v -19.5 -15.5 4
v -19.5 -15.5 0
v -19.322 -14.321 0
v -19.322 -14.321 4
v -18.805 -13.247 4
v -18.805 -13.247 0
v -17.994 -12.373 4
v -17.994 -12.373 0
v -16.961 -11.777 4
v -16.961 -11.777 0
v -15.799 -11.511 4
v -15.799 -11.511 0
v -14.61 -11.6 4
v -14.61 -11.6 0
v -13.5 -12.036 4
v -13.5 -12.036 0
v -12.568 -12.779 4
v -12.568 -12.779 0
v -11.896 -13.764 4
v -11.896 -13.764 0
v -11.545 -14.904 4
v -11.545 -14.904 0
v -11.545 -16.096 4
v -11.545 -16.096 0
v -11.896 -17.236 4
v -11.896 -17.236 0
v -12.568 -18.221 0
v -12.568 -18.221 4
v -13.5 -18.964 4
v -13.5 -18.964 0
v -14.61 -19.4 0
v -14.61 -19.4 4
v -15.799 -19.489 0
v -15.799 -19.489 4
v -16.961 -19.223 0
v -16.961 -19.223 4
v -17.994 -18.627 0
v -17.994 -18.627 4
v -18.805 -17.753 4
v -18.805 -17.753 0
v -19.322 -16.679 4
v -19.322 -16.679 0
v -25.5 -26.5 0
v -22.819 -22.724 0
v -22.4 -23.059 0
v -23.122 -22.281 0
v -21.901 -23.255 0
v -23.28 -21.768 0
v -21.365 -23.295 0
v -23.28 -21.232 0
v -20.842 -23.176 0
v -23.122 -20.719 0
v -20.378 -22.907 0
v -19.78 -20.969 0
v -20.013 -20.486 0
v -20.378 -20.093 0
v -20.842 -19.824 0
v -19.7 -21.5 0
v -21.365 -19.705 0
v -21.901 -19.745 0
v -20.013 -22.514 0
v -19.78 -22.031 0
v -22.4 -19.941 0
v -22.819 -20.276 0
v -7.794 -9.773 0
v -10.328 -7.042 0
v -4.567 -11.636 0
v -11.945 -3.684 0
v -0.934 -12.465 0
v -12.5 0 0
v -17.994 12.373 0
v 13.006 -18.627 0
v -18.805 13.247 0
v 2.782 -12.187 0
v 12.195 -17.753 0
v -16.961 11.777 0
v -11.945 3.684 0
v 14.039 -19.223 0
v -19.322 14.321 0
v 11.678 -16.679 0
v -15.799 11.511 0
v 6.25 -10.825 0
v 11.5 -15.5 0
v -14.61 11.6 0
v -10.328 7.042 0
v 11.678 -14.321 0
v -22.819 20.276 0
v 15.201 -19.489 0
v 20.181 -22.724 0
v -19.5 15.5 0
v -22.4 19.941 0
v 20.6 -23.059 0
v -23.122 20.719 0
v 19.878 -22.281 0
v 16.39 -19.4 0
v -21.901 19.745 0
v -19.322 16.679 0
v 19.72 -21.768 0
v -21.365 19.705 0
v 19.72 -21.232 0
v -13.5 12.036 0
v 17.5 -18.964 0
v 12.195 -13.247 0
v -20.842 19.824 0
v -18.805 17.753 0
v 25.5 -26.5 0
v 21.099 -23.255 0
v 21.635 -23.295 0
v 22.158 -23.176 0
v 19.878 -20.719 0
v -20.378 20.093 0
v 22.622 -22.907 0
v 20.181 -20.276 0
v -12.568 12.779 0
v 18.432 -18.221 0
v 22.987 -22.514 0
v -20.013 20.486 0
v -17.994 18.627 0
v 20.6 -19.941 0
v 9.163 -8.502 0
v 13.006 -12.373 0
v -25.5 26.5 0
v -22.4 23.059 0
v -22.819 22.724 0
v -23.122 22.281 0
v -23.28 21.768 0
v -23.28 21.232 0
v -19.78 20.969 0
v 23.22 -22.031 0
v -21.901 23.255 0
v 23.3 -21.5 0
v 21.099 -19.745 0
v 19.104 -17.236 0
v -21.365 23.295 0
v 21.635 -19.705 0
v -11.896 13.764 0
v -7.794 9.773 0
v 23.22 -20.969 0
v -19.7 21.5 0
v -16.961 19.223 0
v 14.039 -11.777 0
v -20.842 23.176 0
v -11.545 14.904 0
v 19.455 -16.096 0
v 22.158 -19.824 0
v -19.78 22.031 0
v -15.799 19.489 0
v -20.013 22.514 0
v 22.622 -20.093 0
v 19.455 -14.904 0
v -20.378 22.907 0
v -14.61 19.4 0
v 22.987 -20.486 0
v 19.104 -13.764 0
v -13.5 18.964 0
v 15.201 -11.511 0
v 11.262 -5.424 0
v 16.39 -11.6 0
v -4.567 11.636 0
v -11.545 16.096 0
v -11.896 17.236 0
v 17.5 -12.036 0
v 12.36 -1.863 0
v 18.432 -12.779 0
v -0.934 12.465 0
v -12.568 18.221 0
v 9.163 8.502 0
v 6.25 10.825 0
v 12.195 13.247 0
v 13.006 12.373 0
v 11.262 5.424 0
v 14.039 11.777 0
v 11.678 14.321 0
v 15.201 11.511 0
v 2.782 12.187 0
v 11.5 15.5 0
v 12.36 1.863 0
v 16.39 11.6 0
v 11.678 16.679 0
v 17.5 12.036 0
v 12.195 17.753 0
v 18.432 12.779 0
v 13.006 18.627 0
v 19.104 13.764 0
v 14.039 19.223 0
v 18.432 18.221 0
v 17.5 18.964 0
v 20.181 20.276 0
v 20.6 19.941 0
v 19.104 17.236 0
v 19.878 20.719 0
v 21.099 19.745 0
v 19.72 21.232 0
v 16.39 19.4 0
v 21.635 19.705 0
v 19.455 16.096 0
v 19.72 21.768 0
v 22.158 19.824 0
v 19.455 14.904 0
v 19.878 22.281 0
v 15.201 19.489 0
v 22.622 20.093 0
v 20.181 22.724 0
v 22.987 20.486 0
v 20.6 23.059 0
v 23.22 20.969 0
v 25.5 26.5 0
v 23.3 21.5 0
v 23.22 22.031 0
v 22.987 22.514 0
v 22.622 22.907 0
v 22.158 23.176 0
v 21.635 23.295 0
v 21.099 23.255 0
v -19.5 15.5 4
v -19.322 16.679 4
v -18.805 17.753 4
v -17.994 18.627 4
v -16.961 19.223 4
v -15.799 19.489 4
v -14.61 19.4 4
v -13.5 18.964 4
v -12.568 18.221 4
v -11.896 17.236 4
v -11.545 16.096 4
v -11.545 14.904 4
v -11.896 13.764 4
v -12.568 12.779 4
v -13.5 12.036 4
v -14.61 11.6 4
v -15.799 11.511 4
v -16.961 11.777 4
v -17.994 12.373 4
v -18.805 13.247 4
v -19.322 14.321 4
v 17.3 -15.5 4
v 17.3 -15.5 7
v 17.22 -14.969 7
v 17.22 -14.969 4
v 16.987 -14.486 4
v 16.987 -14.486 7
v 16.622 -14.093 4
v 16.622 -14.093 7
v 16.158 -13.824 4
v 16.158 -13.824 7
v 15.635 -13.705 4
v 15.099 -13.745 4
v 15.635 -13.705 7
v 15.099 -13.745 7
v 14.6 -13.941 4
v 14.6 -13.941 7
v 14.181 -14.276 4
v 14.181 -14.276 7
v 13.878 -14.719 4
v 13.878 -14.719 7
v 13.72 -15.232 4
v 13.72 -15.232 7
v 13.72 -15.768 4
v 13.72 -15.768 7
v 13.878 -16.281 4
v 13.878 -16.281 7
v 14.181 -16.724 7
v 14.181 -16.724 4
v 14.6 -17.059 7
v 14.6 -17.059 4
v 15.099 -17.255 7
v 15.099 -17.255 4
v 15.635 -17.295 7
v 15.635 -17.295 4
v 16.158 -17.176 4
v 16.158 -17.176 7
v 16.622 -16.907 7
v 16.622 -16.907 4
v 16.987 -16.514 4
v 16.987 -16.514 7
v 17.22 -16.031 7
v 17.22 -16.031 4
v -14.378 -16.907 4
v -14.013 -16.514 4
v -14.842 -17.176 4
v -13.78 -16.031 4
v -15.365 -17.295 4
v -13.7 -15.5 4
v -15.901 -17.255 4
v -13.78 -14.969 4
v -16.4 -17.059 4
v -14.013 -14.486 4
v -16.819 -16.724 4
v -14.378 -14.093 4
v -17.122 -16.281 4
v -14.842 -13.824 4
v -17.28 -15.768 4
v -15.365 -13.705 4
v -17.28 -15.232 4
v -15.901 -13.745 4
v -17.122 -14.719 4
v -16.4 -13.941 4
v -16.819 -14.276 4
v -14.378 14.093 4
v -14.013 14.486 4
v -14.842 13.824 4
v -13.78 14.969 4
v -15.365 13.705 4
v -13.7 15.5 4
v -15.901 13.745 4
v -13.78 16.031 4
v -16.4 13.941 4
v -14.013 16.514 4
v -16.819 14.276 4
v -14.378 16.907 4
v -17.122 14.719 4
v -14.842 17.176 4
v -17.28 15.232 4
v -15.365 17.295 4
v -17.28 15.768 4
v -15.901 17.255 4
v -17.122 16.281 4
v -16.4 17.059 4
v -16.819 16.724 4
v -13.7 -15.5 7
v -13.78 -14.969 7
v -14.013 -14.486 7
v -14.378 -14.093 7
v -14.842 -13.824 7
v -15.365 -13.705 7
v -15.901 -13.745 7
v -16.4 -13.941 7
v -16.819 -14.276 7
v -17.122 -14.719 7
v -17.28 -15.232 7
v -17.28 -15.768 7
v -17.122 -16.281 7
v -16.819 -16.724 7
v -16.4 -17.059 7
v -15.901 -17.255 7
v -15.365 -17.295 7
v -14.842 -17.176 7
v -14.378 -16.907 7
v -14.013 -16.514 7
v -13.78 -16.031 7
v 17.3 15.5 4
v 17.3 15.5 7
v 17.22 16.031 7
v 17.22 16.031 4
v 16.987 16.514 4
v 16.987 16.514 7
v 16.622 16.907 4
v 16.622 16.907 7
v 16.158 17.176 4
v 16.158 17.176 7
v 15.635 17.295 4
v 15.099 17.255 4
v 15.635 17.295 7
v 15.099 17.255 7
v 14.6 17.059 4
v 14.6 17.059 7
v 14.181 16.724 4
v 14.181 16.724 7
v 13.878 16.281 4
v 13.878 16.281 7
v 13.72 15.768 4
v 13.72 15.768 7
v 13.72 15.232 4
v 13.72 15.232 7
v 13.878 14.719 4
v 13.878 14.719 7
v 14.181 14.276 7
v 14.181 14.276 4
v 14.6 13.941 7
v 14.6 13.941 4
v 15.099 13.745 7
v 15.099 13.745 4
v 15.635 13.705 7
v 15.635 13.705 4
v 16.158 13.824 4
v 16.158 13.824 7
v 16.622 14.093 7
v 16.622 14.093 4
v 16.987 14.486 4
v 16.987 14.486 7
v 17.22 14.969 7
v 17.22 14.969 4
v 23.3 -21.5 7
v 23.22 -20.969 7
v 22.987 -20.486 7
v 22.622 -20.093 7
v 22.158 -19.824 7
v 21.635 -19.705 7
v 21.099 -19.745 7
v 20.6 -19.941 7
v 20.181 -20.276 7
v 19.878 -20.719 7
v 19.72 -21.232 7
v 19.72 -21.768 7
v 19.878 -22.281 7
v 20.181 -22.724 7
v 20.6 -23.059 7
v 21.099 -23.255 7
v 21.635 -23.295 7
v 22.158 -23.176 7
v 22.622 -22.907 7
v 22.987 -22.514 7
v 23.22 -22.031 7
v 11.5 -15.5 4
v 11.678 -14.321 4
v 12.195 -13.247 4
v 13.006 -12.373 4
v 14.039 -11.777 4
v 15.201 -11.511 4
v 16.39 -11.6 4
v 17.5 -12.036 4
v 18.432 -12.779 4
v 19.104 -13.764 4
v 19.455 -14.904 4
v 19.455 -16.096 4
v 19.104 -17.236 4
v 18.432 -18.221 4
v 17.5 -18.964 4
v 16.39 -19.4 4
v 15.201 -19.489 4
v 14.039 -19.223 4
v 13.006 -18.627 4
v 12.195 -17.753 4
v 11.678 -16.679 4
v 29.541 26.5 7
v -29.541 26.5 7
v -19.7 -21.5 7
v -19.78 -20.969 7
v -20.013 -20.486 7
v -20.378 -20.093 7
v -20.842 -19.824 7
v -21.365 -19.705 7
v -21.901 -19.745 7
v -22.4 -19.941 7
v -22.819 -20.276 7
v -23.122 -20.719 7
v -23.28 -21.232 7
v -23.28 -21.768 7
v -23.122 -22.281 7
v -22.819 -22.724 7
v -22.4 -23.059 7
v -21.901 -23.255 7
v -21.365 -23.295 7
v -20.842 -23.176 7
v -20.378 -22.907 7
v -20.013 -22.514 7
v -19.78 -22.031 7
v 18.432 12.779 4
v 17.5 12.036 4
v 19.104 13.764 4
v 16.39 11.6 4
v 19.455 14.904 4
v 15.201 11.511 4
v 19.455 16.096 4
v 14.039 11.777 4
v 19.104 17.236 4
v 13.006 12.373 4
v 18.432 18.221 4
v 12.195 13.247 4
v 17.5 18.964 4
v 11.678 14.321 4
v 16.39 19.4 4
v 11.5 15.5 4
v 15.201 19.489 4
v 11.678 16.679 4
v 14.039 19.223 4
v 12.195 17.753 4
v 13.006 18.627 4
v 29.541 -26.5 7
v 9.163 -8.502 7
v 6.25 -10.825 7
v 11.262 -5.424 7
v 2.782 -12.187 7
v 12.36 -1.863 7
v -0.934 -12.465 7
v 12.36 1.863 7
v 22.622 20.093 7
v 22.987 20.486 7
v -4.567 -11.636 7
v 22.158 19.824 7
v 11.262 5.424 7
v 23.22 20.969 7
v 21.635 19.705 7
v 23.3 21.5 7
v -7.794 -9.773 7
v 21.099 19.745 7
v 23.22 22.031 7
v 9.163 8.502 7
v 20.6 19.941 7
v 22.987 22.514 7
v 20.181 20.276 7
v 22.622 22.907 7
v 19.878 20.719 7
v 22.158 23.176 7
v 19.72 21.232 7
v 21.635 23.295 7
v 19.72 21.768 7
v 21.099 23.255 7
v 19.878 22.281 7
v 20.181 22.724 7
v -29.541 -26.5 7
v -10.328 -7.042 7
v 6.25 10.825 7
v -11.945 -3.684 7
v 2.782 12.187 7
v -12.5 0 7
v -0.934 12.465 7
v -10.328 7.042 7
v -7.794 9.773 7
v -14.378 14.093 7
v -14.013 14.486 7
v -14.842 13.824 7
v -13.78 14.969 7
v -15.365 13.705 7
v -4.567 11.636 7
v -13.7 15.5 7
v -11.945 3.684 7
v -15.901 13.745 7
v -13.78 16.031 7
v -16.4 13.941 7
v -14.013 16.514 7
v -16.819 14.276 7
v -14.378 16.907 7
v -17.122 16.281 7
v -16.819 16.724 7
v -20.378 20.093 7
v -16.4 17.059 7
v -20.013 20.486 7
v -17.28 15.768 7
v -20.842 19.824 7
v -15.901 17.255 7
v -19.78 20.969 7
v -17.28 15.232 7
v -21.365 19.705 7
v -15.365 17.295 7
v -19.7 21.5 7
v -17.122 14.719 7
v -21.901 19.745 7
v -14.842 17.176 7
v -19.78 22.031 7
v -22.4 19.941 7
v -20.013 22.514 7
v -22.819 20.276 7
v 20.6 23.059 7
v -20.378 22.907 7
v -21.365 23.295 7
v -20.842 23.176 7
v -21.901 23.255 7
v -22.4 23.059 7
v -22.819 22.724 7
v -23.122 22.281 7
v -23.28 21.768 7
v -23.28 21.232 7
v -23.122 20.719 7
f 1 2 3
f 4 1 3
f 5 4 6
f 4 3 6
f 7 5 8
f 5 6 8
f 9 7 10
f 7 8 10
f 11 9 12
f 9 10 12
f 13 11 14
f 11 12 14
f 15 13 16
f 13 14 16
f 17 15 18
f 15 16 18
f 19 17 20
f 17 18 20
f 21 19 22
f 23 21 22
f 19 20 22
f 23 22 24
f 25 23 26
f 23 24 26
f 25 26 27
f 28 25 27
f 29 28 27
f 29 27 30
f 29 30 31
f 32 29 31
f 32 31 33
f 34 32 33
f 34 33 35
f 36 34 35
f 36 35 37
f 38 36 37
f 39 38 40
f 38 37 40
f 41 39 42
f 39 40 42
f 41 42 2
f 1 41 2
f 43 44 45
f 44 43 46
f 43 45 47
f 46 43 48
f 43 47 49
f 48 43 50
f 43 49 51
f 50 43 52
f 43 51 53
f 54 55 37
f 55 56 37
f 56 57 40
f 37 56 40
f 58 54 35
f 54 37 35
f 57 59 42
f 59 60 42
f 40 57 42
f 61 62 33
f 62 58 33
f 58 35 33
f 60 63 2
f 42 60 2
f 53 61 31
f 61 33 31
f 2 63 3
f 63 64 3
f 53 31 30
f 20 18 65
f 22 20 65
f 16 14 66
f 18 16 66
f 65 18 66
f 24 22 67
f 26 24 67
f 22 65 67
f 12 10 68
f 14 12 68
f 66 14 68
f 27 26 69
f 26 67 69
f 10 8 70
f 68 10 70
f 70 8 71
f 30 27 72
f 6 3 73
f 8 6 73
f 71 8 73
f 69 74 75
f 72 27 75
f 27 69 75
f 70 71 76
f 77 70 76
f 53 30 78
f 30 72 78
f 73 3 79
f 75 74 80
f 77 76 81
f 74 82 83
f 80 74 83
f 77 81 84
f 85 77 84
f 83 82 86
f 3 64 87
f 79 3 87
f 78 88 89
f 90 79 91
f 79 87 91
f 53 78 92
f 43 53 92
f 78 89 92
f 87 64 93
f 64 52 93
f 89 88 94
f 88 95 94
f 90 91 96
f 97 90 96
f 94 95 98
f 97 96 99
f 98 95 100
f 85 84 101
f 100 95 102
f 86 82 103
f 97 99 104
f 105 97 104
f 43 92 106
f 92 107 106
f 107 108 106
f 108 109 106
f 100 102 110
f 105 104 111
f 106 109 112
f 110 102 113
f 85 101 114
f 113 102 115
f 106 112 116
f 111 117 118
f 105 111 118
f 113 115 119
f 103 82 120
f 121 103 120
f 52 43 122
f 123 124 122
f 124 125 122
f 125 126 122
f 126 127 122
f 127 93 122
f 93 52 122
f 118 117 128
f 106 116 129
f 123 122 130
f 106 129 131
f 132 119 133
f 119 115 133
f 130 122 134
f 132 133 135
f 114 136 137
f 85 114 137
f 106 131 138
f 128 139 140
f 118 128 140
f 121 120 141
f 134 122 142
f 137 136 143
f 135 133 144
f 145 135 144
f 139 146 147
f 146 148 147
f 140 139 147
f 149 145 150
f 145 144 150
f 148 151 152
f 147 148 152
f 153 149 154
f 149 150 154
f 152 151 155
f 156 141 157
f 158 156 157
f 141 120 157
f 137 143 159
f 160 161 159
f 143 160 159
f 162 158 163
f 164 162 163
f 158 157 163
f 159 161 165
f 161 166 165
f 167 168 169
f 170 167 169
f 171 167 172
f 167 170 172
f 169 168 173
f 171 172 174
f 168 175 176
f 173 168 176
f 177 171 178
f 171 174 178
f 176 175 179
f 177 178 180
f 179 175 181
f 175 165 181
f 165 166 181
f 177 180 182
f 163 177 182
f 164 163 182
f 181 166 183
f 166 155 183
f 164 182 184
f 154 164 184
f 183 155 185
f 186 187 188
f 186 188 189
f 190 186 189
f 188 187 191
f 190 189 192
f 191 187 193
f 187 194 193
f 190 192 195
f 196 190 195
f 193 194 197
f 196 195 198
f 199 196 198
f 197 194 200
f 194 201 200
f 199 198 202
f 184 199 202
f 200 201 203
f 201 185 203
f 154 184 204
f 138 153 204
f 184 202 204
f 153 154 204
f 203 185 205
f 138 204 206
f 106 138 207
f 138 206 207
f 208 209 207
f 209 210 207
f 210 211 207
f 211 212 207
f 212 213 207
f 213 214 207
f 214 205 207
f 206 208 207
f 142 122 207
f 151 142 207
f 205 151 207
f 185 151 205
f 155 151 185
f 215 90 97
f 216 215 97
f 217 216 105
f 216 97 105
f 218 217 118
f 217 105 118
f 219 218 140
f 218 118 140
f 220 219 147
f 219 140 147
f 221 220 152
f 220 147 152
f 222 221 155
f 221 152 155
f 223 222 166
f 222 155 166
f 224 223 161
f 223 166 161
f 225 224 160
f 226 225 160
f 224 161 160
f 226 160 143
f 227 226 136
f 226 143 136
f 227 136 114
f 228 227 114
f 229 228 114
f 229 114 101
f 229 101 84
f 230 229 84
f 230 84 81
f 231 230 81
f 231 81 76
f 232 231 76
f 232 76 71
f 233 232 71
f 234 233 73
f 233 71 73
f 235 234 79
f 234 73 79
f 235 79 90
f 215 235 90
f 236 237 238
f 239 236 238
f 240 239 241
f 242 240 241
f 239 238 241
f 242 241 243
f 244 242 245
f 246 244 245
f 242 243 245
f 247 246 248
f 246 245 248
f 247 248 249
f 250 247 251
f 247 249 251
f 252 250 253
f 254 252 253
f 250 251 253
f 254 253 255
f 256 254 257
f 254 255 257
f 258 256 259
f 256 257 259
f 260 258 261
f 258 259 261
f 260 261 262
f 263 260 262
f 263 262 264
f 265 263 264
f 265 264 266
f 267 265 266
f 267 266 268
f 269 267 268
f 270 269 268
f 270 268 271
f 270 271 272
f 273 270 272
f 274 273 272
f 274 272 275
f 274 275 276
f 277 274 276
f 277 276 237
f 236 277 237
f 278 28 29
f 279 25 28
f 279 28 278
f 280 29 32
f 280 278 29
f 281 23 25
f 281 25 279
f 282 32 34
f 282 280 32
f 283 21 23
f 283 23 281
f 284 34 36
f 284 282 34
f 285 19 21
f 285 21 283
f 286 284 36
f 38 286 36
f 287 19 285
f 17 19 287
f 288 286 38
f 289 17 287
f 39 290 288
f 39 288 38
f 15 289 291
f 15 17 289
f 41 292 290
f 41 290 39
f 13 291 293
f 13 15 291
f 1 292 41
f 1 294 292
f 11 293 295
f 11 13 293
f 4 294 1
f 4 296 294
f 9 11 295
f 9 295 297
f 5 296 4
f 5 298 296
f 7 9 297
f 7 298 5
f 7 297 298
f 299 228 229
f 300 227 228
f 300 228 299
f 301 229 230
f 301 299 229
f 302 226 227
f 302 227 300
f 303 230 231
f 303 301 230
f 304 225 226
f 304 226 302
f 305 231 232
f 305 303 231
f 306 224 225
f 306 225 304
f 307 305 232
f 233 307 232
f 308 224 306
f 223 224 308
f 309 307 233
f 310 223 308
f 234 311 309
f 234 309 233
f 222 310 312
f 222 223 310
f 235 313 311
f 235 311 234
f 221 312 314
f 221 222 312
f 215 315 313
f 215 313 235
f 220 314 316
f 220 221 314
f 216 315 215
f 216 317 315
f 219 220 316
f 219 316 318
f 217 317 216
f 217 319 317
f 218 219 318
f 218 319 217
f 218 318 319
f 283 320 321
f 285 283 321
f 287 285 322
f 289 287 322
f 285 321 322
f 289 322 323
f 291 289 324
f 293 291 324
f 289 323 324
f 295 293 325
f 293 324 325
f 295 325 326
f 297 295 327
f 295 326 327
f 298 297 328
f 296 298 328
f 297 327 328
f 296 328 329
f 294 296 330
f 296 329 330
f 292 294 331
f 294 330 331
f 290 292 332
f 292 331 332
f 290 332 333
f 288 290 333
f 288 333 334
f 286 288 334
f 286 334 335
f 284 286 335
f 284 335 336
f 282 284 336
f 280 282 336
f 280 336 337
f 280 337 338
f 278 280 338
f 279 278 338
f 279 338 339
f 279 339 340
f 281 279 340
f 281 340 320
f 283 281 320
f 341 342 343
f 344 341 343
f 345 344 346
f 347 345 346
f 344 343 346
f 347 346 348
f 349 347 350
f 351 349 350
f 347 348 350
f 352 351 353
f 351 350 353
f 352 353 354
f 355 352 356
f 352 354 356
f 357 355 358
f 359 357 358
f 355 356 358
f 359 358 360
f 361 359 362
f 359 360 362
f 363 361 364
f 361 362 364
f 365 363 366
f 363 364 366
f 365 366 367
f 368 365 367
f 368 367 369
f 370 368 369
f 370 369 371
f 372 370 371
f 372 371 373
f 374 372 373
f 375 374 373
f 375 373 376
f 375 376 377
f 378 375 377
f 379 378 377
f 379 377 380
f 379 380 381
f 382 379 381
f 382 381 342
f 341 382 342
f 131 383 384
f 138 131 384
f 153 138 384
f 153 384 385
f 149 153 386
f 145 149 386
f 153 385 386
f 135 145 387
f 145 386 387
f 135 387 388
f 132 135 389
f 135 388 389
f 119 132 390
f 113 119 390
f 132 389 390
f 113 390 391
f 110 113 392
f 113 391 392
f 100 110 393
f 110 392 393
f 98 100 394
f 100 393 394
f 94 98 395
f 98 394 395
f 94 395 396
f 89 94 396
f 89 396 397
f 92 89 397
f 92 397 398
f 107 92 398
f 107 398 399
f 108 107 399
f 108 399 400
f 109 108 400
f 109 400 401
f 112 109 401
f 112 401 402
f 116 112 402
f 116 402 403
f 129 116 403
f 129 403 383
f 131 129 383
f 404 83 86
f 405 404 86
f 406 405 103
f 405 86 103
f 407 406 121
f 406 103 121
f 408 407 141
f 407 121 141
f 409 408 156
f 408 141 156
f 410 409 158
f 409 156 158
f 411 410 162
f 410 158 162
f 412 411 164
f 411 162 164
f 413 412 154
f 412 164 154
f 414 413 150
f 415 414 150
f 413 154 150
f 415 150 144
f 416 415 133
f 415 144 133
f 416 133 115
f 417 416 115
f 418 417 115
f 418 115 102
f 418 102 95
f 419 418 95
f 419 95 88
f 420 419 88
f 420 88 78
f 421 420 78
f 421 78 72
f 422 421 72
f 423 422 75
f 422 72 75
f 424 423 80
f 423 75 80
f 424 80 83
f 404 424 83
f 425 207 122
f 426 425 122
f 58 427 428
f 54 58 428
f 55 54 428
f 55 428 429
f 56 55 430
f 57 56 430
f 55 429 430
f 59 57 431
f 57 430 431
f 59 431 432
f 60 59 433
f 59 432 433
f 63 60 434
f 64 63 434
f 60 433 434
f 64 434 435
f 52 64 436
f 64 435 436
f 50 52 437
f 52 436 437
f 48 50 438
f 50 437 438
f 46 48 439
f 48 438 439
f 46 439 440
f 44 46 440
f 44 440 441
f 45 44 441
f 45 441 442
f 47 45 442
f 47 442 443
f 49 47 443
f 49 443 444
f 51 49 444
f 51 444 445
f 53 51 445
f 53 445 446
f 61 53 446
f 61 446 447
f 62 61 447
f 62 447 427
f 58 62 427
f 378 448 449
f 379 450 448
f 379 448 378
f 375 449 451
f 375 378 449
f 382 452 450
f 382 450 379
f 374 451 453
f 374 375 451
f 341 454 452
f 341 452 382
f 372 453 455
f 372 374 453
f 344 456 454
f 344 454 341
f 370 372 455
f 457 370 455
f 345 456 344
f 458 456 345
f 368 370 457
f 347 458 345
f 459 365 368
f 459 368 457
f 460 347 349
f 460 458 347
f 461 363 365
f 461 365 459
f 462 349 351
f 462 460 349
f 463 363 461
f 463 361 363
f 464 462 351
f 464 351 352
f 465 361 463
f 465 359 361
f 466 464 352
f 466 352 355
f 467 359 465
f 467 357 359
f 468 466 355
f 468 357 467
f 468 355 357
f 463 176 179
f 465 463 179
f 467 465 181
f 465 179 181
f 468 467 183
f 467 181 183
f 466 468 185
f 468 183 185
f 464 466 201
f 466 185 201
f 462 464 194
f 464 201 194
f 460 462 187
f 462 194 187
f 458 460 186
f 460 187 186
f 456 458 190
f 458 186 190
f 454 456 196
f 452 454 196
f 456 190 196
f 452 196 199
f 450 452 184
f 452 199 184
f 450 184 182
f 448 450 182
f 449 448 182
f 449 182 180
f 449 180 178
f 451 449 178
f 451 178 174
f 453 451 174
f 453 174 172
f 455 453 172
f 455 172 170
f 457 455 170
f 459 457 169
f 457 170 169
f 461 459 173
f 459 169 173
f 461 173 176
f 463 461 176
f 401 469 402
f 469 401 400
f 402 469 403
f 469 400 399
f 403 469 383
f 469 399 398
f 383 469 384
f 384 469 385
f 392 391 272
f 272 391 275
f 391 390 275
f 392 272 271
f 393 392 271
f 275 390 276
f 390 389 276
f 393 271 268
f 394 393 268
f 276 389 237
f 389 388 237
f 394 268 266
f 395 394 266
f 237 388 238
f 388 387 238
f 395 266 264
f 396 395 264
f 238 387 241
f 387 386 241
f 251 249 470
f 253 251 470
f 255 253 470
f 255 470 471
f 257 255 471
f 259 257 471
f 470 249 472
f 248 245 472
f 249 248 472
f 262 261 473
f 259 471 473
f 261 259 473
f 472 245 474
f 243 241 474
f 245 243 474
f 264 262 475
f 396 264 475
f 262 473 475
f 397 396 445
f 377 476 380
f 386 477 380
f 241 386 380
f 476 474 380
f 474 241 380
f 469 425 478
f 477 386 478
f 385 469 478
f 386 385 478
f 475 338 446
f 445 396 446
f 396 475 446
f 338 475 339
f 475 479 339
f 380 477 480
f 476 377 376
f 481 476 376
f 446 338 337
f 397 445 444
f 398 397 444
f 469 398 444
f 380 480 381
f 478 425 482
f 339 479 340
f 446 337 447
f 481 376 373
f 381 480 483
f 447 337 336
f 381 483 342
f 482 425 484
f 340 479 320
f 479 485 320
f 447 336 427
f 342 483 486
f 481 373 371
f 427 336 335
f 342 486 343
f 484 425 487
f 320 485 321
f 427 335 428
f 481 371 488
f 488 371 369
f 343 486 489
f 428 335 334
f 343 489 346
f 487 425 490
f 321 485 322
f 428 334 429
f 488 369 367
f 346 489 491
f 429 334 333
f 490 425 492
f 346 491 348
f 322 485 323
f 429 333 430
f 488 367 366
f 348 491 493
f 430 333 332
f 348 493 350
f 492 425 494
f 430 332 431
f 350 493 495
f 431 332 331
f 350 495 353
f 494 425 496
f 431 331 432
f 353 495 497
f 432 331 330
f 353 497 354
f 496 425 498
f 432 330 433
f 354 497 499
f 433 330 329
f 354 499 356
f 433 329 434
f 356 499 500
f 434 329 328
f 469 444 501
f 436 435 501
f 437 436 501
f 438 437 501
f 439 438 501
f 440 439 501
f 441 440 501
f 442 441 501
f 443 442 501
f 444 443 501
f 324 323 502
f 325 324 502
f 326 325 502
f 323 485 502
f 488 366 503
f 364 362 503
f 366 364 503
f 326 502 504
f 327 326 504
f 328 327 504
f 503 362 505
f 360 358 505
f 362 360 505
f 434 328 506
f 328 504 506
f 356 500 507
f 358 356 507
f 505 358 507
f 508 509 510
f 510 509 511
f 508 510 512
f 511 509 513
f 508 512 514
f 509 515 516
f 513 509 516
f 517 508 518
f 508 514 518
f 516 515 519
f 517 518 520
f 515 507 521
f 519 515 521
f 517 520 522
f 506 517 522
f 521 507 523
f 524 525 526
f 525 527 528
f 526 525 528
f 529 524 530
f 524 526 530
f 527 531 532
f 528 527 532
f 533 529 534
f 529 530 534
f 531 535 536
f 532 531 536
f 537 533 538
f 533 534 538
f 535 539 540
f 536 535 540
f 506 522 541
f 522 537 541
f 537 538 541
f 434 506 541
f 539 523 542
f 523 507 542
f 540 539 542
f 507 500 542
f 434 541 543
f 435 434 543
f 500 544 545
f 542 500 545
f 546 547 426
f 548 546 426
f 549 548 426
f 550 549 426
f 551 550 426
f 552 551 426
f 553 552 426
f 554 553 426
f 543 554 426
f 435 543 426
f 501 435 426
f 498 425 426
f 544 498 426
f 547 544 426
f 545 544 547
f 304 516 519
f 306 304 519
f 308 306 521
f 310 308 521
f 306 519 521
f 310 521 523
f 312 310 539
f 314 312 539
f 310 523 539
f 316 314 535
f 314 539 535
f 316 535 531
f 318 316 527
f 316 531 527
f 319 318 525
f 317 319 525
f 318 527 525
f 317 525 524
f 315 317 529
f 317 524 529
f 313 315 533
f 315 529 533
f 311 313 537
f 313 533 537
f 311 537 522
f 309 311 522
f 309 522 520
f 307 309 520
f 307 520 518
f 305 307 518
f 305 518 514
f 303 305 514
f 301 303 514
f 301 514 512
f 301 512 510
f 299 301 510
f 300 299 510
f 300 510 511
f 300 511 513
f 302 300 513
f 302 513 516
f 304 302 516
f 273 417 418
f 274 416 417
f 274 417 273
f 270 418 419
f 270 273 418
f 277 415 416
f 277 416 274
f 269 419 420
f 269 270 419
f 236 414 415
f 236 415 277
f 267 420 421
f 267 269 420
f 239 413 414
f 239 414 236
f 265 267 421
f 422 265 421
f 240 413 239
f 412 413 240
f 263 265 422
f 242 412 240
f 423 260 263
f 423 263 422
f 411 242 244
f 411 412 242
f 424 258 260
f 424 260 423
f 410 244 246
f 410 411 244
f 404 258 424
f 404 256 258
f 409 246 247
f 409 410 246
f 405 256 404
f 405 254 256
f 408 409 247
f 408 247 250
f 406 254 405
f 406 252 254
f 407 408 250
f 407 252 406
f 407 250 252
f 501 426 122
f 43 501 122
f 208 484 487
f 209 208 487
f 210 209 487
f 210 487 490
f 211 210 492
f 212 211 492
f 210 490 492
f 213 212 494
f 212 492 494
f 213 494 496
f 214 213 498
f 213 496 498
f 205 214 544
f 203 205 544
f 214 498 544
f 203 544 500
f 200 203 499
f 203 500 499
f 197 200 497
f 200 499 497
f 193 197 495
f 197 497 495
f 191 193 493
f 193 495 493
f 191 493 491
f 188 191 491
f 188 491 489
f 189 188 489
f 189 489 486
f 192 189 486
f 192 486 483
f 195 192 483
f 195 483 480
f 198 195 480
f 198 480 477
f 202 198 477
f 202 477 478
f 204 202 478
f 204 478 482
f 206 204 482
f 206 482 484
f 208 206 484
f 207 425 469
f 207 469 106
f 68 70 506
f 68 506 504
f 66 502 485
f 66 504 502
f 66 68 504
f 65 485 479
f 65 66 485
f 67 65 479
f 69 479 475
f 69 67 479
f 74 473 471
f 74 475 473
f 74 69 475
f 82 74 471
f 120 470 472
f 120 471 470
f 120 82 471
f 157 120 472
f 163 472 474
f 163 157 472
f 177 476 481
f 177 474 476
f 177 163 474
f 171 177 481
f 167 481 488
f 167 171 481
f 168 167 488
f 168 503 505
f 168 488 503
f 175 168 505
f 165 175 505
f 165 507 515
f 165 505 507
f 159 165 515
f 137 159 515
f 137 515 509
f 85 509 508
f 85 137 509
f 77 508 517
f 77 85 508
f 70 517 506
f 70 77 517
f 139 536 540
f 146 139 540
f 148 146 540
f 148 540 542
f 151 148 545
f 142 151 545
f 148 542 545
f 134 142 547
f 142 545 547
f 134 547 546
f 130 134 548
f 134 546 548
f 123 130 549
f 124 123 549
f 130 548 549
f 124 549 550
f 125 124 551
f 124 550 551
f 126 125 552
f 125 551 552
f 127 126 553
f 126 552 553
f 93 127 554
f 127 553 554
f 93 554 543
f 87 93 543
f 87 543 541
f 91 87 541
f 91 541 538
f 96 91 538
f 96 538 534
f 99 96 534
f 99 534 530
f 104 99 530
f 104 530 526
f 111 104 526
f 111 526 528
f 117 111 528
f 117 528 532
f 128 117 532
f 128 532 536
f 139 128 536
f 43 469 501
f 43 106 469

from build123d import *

# Parameters (mm, degrees)
SKETCH1_W               = 51
SKETCH1_H               = 53
BOSS_EXTRUDE1_DEPTH     = 7
CUT_EXTRUDE3_DEPTH      = 38.436613095
CUT_EXTRUDE3_DEPTH_BACK = 10
SKETCH2_R               = 12.5
SKETCH3_R               = 1.8
CUT_EXTRUDE4_DEPTH      = 10
SKETCH4_R               = 1.8
CUT_EXTRUDE5_DEPTH      = 11
BOSS_EXTRUDE2_DEPTH     = 53
SKETCH6_R               = 4
CUT_EXTRUDE6_DEPTH      = 4


with BuildPart() as part:
    # Sketch1 → Boss-Extrude1 (new body)
    with BuildSketch(Plane.XY):
        Rectangle(SKETCH1_W, SKETCH1_H)
    extrude(amount=BOSS_EXTRUDE1_DEPTH)

    # Sketch2 → Cut-Extrude3 (cut, two sides: drawn at the far end of the back side and taken through both)
    with BuildSketch(Plane.XY.offset(-CUT_EXTRUDE3_DEPTH_BACK)):
        with Locations(Location((0, 0, 0), (0, 0, 180))):
            Circle(SKETCH2_R)
    extrude(amount=CUT_EXTRUDE3_DEPTH + CUT_EXTRUDE3_DEPTH_BACK, mode=Mode.SUBTRACT)

    # Sketch3 → Cut-Extrude4 (cut)
    with BuildSketch(Plane.XY.offset(7)):
        with Locations((-15.5, 15.5)):
            Circle(SKETCH3_R)
        with Locations((15.5, 15.5)):
            Circle(SKETCH3_R)
        with Locations((15.5, -15.5)):
            Circle(SKETCH3_R)
        with Locations((-15.5, -15.5)):
            Circle(SKETCH3_R)
    extrude(amount=-CUT_EXTRUDE4_DEPTH, mode=Mode.SUBTRACT)

    # Sketch4 → Cut-Extrude5 (cut)
    with BuildSketch(Plane.XY.offset(7)):
        with Locations((-21.5, 21.5)):
            Circle(SKETCH4_R)
        with Locations((21.5, 21.5)):
            Circle(SKETCH4_R)
        with Locations((21.5, -21.5)):
            Circle(SKETCH4_R)
        with Locations((-21.5, -21.5)):
            Circle(SKETCH4_R)
    extrude(amount=-CUT_EXTRUDE5_DEPTH, mode=Mode.SUBTRACT)

    # Sketch5 → Boss-Extrude2 (add)
    with BuildSketch(Plane(origin=(0, 26.5, 0), x_dir=(1, 0, 0), z_dir=(0, 1, 0))):
        Polygon((-25.5, -7), (-29.541451884, -7), (-25.5, 0), align=None)
        Polygon((25.5, 0), (25.5, -7), (29.541451884, -7), align=None)
    extrude(amount=-BOSS_EXTRUDE2_DEPTH)

    # Sketch6 → Cut-Extrude6 (cut)
    with BuildSketch(Plane(origin=(0, 0, 0), x_dir=(-1, 0, 0), z_dir=(0, 0, -1))):
        with Locations((-15.5, 15.5)):
            Circle(SKETCH6_R)
        with Locations((15.5, 15.5)):
            Circle(SKETCH6_R)
        with Locations((15.5, -15.5)):
            Circle(SKETCH6_R)
        with Locations((-15.5, -15.5)):
            Circle(SKETCH6_R)
    extrude(amount=-CUT_EXTRUDE6_DEPTH, mode=Mode.SUBTRACT)


solid = part.part
